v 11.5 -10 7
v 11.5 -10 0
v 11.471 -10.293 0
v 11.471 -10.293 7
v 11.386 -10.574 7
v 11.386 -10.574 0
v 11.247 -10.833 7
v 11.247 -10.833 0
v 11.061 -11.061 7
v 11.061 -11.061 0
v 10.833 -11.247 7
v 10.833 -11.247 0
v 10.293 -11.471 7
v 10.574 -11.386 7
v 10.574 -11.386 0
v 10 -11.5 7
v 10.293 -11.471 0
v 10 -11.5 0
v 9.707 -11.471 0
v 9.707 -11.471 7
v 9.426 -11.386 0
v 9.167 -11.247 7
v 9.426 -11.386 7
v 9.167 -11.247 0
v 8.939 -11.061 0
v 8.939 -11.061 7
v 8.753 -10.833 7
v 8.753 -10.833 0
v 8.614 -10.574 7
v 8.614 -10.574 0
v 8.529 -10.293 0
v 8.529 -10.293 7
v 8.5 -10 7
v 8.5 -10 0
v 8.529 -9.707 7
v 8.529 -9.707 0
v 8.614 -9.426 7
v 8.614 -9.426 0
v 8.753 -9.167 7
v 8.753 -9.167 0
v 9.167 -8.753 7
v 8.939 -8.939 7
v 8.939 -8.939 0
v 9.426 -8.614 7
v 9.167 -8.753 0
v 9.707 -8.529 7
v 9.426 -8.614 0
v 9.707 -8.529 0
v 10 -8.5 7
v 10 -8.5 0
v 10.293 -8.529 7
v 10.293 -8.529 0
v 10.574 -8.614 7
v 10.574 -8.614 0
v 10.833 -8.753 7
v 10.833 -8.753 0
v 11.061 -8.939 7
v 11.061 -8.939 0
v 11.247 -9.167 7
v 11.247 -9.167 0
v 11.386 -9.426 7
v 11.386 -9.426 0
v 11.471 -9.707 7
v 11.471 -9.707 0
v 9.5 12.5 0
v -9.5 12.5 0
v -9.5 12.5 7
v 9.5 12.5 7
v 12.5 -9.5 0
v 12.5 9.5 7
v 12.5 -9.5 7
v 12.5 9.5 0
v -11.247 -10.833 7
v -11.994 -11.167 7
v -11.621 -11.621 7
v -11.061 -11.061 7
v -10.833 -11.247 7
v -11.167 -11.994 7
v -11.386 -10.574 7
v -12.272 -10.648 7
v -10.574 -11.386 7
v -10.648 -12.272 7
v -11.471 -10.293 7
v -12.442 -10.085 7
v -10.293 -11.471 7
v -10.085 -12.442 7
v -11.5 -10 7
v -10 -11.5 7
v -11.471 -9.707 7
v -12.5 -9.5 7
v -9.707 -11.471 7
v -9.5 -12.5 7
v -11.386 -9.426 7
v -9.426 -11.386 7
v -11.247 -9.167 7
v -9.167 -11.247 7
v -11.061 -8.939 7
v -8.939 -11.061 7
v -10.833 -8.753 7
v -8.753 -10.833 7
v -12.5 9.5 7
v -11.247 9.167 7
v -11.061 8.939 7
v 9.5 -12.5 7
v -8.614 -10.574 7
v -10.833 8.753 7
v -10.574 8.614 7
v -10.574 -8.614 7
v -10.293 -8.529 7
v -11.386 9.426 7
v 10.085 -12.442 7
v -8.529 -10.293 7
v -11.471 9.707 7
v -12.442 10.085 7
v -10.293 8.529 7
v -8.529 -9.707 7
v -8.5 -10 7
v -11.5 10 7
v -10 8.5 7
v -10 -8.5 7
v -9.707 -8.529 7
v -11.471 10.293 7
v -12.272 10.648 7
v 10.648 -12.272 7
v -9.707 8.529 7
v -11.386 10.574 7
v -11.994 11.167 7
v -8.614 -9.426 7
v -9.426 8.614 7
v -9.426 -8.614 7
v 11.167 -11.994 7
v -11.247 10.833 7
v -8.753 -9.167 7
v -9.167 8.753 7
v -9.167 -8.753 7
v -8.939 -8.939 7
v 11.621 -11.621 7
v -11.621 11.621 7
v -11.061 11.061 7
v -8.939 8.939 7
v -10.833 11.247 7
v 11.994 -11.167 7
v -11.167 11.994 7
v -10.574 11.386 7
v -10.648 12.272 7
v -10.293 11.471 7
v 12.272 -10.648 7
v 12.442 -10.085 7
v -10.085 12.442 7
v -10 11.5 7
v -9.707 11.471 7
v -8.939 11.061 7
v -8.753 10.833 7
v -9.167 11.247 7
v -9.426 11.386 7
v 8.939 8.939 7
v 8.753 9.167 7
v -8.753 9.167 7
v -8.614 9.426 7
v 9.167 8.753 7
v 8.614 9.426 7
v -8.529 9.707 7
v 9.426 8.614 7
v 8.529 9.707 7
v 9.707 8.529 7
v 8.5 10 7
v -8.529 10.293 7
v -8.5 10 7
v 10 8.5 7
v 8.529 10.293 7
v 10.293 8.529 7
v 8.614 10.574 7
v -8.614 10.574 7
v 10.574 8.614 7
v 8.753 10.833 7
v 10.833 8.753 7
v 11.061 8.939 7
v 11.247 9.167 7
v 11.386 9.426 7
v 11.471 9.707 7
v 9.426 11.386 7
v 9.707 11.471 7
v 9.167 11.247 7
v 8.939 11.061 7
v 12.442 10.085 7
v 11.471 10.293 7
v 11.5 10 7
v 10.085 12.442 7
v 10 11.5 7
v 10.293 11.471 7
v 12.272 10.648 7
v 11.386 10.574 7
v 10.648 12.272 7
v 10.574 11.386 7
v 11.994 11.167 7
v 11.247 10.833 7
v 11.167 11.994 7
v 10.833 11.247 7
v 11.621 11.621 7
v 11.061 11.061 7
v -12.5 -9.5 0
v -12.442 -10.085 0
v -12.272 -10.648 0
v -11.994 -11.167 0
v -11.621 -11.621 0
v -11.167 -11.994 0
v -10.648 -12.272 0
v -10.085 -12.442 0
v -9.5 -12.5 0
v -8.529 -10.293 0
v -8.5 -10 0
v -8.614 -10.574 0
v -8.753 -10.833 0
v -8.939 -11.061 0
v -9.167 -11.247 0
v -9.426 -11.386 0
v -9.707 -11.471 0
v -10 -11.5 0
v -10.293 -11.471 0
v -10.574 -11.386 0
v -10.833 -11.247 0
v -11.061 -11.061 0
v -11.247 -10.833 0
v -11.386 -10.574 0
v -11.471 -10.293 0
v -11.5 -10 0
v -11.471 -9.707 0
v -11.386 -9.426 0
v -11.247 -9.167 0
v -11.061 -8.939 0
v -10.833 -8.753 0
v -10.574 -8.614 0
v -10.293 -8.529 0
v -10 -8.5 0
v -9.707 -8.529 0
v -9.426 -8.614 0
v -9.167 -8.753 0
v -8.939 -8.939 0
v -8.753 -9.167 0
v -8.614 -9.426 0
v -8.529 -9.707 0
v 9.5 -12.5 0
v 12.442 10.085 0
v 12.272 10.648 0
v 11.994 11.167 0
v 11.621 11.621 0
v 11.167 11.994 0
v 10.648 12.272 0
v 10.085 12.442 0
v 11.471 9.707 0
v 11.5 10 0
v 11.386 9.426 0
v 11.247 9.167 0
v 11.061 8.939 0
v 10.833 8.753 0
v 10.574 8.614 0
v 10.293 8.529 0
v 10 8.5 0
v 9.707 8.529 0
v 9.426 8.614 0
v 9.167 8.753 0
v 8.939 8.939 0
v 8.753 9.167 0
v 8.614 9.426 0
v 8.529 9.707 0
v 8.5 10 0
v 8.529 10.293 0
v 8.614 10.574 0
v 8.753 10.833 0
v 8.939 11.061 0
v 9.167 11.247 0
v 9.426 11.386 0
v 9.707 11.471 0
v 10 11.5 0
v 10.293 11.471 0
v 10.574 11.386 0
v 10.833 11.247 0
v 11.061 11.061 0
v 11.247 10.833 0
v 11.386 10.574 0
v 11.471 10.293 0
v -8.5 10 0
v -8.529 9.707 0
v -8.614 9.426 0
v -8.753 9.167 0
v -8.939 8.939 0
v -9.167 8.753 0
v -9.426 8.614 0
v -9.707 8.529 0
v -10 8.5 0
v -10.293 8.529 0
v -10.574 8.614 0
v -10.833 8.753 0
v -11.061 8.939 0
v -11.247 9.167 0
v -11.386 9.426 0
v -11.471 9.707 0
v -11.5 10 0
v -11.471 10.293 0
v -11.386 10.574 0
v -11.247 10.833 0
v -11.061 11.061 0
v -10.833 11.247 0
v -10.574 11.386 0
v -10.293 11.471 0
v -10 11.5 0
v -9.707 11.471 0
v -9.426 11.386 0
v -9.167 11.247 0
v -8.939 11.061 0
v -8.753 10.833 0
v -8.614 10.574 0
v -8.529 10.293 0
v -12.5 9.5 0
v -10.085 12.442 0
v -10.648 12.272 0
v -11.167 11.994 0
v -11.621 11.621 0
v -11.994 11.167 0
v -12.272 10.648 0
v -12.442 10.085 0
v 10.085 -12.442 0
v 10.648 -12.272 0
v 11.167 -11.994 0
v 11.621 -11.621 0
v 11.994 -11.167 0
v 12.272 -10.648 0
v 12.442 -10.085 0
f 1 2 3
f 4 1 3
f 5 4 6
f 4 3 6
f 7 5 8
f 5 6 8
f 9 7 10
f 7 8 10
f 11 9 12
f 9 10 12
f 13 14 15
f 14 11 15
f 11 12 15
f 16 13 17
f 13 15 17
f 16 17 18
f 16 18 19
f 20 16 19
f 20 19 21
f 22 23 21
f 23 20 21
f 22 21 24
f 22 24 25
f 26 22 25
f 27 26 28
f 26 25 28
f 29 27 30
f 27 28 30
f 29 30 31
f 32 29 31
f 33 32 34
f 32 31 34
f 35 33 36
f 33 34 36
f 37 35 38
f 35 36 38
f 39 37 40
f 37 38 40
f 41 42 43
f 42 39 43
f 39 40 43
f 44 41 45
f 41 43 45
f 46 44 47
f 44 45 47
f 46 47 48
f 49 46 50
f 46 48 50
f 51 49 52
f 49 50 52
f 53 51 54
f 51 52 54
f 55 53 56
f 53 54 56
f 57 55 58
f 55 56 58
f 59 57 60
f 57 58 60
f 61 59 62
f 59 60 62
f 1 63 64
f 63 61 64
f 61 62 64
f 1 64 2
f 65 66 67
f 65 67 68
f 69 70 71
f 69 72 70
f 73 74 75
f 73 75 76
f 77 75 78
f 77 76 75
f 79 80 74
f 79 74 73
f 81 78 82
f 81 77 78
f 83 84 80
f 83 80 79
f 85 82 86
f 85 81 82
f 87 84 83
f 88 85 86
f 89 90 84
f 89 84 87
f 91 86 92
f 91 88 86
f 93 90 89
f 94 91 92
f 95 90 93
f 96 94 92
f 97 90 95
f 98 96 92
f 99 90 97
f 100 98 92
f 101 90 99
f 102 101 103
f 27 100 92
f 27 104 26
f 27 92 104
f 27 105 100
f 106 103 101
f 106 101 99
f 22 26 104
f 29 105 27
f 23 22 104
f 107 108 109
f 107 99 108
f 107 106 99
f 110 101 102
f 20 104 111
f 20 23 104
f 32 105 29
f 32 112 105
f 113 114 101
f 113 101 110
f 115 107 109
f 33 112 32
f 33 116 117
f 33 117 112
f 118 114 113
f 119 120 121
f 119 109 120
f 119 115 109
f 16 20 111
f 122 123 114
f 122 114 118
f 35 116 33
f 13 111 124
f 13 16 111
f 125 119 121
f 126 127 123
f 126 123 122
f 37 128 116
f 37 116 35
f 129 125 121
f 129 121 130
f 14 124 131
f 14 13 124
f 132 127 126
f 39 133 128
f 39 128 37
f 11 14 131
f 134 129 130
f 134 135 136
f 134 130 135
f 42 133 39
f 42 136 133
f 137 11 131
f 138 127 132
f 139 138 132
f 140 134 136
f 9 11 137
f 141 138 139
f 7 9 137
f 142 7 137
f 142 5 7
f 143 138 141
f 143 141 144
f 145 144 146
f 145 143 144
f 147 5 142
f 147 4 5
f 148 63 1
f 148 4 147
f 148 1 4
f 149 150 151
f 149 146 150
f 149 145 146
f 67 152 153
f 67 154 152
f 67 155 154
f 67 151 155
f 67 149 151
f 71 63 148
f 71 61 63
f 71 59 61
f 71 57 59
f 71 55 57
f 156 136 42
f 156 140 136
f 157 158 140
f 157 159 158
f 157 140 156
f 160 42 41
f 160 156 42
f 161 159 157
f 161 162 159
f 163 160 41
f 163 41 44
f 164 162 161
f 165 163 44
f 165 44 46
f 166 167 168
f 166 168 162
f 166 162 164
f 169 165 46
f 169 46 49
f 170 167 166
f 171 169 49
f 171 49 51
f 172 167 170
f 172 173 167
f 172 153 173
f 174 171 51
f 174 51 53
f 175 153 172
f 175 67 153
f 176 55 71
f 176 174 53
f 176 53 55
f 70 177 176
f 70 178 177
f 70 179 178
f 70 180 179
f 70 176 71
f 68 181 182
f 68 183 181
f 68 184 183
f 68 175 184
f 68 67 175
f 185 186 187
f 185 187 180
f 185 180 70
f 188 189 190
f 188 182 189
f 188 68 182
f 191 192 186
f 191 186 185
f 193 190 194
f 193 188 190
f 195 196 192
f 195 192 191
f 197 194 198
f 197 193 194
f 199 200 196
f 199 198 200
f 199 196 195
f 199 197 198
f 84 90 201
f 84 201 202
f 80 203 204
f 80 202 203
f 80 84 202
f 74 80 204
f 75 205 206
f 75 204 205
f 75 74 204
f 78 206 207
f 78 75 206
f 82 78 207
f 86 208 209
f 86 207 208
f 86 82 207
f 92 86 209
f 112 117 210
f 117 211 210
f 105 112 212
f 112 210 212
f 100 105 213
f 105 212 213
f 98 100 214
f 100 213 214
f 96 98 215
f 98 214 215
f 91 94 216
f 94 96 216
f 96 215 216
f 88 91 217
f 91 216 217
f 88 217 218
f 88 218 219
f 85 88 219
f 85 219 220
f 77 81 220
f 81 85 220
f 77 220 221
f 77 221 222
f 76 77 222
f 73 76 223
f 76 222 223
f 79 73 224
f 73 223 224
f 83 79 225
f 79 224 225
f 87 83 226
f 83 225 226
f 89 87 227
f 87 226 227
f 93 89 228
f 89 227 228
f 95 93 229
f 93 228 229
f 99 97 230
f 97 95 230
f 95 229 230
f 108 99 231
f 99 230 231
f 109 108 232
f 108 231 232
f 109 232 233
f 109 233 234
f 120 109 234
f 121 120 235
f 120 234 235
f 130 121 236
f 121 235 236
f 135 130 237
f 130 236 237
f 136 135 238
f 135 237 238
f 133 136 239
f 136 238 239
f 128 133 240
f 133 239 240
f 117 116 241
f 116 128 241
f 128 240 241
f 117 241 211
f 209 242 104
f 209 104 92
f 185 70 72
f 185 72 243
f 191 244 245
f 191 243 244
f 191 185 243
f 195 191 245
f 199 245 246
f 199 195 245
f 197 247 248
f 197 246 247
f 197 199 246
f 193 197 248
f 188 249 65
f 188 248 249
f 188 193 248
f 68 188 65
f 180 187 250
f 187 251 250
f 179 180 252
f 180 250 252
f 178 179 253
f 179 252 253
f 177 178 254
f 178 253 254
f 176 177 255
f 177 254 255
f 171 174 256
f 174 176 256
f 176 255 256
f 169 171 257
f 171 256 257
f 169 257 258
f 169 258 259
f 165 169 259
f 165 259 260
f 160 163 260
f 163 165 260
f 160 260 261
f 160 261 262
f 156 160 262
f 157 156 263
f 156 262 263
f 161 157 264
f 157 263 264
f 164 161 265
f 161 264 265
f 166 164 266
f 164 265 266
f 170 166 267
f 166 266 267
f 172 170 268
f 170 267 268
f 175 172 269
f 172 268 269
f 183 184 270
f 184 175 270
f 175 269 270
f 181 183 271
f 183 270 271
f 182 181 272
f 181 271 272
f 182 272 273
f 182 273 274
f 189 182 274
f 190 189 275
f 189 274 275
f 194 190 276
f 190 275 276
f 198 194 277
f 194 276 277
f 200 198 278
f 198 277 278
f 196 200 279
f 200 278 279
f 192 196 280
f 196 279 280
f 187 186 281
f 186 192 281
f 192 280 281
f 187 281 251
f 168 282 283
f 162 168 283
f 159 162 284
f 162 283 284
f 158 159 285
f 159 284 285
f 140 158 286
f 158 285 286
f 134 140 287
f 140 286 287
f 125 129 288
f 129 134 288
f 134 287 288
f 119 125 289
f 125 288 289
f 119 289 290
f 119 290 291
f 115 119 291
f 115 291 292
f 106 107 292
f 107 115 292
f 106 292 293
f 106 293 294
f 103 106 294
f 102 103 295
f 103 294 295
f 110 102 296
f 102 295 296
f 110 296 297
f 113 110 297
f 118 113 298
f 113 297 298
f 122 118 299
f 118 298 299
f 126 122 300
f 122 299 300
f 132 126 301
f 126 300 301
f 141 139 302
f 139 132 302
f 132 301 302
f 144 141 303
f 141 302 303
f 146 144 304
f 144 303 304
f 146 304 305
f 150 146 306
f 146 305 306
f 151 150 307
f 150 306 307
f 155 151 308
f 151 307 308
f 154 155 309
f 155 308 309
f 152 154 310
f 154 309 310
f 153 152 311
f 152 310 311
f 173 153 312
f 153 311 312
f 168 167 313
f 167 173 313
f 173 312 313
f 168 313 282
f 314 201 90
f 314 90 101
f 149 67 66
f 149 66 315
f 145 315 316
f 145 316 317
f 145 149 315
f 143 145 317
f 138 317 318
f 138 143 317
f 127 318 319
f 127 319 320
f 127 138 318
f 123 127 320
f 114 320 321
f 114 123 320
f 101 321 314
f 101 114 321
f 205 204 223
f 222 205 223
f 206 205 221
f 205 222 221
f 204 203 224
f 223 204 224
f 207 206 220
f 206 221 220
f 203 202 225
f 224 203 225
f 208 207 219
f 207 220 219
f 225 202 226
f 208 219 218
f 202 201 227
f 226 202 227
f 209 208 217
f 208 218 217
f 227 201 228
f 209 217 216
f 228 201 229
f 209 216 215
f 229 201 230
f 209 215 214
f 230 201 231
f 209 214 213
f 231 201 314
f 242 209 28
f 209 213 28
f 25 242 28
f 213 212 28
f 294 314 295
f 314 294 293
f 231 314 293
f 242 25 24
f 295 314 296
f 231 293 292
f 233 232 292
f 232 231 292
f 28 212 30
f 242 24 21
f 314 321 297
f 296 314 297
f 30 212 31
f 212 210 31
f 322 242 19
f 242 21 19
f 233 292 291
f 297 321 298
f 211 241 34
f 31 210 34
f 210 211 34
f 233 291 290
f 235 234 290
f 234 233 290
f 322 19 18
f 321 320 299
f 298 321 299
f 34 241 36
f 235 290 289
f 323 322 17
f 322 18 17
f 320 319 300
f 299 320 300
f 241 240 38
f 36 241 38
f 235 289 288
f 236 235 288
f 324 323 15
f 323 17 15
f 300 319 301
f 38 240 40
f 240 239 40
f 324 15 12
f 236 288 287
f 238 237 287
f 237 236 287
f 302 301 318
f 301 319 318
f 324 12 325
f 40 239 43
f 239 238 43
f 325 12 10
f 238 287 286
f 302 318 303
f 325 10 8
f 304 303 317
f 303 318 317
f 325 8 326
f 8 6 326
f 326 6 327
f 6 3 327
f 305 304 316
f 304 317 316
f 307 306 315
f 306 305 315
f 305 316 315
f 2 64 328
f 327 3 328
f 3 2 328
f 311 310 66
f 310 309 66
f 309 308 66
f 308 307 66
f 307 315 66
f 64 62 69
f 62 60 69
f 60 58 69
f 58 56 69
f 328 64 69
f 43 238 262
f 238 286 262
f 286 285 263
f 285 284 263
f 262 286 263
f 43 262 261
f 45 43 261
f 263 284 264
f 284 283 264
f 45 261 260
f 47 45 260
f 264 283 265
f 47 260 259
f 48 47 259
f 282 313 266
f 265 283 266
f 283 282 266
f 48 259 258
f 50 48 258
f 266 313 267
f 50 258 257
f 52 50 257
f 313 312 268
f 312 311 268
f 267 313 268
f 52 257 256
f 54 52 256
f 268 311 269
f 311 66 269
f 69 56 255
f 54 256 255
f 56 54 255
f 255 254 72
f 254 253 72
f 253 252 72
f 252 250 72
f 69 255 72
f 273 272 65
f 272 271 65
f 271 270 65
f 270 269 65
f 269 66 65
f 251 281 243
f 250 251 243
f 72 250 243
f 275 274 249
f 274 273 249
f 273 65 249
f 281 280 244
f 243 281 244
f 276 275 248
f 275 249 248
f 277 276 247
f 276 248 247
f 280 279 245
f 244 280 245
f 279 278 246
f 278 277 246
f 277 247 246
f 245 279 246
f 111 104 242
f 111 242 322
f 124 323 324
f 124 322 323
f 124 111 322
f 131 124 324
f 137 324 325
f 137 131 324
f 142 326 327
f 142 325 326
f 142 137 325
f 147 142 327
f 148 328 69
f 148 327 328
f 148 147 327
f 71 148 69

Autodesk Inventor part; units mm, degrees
ref_plane "YZ Plane" through (0, 0, 0) normal (1, 0, 0) x (0, 1, 0)
ref_plane "XZ Plane" through (0, 0, 0) normal (0, 1, 0) x (-1, 0, 0)
ref_plane "XY Plane" through (0, 0, 0) normal (0, 0, 1) x (1, 0, 0)
sketch "スケッチ1" plane through (0, 0, 0) normal (0, 0, 1) x (1, 0, 0)
  line L0 (-12.5, 12.5) -> (12.5, 12.5)
  line L1 (12.5, 12.5) -> (12.5, -12.5)
  line L2 (12.5, -12.5) -> (-12.5, -12.5)
  line L3 (-12.5, -12.5) -> (-12.5, 12.5)
  line L4 (-12.5, 12.5) -> (12.5, -12.5) construction
  line L5 (12.5, 12.5) -> (-12.5, -12.5) construction
  line L6 (10, 10) -> (-10, 10) construction
  line L7 (-10, 10) -> (-10, -10) construction
  line L8 (-10, -10) -> (10, -10) construction
  line L9 (10, -10) -> (10, 10) construction
  line L10 (10, 10) -> (-10, -10) construction
  line L11 (-10, 10) -> (10, -10) construction
  circle A0 centre (-10, 10) radius 1.5
  circle A1 centre (10, 10) radius 1.5
  circle A2 centre (-10, -10) radius 1.5
  circle A3 centre (10, -10) radius 1.5
  point P0 (0, 0)
  dimension "d0" = 25
  dimension "d1" = 25
  dimension "d2" = 20
  dimension "d3" = 20
  dimension "d4" = 3
  dimension "d5" = 3
  dimension "d6" = 3
  dimension "d7" = 3
extrude "押し出し1" add sketch "スケッチ1" along normal blind 7
fillet "フィレット1" radius 3 4 edges at (-12.5, 12.5, 3.5) (12.5, 12.5, 3.5) (12.5, -12.5, 3.5) (-12.5, -12.5, 3.5)
properties part number "YDM2507C12F"
